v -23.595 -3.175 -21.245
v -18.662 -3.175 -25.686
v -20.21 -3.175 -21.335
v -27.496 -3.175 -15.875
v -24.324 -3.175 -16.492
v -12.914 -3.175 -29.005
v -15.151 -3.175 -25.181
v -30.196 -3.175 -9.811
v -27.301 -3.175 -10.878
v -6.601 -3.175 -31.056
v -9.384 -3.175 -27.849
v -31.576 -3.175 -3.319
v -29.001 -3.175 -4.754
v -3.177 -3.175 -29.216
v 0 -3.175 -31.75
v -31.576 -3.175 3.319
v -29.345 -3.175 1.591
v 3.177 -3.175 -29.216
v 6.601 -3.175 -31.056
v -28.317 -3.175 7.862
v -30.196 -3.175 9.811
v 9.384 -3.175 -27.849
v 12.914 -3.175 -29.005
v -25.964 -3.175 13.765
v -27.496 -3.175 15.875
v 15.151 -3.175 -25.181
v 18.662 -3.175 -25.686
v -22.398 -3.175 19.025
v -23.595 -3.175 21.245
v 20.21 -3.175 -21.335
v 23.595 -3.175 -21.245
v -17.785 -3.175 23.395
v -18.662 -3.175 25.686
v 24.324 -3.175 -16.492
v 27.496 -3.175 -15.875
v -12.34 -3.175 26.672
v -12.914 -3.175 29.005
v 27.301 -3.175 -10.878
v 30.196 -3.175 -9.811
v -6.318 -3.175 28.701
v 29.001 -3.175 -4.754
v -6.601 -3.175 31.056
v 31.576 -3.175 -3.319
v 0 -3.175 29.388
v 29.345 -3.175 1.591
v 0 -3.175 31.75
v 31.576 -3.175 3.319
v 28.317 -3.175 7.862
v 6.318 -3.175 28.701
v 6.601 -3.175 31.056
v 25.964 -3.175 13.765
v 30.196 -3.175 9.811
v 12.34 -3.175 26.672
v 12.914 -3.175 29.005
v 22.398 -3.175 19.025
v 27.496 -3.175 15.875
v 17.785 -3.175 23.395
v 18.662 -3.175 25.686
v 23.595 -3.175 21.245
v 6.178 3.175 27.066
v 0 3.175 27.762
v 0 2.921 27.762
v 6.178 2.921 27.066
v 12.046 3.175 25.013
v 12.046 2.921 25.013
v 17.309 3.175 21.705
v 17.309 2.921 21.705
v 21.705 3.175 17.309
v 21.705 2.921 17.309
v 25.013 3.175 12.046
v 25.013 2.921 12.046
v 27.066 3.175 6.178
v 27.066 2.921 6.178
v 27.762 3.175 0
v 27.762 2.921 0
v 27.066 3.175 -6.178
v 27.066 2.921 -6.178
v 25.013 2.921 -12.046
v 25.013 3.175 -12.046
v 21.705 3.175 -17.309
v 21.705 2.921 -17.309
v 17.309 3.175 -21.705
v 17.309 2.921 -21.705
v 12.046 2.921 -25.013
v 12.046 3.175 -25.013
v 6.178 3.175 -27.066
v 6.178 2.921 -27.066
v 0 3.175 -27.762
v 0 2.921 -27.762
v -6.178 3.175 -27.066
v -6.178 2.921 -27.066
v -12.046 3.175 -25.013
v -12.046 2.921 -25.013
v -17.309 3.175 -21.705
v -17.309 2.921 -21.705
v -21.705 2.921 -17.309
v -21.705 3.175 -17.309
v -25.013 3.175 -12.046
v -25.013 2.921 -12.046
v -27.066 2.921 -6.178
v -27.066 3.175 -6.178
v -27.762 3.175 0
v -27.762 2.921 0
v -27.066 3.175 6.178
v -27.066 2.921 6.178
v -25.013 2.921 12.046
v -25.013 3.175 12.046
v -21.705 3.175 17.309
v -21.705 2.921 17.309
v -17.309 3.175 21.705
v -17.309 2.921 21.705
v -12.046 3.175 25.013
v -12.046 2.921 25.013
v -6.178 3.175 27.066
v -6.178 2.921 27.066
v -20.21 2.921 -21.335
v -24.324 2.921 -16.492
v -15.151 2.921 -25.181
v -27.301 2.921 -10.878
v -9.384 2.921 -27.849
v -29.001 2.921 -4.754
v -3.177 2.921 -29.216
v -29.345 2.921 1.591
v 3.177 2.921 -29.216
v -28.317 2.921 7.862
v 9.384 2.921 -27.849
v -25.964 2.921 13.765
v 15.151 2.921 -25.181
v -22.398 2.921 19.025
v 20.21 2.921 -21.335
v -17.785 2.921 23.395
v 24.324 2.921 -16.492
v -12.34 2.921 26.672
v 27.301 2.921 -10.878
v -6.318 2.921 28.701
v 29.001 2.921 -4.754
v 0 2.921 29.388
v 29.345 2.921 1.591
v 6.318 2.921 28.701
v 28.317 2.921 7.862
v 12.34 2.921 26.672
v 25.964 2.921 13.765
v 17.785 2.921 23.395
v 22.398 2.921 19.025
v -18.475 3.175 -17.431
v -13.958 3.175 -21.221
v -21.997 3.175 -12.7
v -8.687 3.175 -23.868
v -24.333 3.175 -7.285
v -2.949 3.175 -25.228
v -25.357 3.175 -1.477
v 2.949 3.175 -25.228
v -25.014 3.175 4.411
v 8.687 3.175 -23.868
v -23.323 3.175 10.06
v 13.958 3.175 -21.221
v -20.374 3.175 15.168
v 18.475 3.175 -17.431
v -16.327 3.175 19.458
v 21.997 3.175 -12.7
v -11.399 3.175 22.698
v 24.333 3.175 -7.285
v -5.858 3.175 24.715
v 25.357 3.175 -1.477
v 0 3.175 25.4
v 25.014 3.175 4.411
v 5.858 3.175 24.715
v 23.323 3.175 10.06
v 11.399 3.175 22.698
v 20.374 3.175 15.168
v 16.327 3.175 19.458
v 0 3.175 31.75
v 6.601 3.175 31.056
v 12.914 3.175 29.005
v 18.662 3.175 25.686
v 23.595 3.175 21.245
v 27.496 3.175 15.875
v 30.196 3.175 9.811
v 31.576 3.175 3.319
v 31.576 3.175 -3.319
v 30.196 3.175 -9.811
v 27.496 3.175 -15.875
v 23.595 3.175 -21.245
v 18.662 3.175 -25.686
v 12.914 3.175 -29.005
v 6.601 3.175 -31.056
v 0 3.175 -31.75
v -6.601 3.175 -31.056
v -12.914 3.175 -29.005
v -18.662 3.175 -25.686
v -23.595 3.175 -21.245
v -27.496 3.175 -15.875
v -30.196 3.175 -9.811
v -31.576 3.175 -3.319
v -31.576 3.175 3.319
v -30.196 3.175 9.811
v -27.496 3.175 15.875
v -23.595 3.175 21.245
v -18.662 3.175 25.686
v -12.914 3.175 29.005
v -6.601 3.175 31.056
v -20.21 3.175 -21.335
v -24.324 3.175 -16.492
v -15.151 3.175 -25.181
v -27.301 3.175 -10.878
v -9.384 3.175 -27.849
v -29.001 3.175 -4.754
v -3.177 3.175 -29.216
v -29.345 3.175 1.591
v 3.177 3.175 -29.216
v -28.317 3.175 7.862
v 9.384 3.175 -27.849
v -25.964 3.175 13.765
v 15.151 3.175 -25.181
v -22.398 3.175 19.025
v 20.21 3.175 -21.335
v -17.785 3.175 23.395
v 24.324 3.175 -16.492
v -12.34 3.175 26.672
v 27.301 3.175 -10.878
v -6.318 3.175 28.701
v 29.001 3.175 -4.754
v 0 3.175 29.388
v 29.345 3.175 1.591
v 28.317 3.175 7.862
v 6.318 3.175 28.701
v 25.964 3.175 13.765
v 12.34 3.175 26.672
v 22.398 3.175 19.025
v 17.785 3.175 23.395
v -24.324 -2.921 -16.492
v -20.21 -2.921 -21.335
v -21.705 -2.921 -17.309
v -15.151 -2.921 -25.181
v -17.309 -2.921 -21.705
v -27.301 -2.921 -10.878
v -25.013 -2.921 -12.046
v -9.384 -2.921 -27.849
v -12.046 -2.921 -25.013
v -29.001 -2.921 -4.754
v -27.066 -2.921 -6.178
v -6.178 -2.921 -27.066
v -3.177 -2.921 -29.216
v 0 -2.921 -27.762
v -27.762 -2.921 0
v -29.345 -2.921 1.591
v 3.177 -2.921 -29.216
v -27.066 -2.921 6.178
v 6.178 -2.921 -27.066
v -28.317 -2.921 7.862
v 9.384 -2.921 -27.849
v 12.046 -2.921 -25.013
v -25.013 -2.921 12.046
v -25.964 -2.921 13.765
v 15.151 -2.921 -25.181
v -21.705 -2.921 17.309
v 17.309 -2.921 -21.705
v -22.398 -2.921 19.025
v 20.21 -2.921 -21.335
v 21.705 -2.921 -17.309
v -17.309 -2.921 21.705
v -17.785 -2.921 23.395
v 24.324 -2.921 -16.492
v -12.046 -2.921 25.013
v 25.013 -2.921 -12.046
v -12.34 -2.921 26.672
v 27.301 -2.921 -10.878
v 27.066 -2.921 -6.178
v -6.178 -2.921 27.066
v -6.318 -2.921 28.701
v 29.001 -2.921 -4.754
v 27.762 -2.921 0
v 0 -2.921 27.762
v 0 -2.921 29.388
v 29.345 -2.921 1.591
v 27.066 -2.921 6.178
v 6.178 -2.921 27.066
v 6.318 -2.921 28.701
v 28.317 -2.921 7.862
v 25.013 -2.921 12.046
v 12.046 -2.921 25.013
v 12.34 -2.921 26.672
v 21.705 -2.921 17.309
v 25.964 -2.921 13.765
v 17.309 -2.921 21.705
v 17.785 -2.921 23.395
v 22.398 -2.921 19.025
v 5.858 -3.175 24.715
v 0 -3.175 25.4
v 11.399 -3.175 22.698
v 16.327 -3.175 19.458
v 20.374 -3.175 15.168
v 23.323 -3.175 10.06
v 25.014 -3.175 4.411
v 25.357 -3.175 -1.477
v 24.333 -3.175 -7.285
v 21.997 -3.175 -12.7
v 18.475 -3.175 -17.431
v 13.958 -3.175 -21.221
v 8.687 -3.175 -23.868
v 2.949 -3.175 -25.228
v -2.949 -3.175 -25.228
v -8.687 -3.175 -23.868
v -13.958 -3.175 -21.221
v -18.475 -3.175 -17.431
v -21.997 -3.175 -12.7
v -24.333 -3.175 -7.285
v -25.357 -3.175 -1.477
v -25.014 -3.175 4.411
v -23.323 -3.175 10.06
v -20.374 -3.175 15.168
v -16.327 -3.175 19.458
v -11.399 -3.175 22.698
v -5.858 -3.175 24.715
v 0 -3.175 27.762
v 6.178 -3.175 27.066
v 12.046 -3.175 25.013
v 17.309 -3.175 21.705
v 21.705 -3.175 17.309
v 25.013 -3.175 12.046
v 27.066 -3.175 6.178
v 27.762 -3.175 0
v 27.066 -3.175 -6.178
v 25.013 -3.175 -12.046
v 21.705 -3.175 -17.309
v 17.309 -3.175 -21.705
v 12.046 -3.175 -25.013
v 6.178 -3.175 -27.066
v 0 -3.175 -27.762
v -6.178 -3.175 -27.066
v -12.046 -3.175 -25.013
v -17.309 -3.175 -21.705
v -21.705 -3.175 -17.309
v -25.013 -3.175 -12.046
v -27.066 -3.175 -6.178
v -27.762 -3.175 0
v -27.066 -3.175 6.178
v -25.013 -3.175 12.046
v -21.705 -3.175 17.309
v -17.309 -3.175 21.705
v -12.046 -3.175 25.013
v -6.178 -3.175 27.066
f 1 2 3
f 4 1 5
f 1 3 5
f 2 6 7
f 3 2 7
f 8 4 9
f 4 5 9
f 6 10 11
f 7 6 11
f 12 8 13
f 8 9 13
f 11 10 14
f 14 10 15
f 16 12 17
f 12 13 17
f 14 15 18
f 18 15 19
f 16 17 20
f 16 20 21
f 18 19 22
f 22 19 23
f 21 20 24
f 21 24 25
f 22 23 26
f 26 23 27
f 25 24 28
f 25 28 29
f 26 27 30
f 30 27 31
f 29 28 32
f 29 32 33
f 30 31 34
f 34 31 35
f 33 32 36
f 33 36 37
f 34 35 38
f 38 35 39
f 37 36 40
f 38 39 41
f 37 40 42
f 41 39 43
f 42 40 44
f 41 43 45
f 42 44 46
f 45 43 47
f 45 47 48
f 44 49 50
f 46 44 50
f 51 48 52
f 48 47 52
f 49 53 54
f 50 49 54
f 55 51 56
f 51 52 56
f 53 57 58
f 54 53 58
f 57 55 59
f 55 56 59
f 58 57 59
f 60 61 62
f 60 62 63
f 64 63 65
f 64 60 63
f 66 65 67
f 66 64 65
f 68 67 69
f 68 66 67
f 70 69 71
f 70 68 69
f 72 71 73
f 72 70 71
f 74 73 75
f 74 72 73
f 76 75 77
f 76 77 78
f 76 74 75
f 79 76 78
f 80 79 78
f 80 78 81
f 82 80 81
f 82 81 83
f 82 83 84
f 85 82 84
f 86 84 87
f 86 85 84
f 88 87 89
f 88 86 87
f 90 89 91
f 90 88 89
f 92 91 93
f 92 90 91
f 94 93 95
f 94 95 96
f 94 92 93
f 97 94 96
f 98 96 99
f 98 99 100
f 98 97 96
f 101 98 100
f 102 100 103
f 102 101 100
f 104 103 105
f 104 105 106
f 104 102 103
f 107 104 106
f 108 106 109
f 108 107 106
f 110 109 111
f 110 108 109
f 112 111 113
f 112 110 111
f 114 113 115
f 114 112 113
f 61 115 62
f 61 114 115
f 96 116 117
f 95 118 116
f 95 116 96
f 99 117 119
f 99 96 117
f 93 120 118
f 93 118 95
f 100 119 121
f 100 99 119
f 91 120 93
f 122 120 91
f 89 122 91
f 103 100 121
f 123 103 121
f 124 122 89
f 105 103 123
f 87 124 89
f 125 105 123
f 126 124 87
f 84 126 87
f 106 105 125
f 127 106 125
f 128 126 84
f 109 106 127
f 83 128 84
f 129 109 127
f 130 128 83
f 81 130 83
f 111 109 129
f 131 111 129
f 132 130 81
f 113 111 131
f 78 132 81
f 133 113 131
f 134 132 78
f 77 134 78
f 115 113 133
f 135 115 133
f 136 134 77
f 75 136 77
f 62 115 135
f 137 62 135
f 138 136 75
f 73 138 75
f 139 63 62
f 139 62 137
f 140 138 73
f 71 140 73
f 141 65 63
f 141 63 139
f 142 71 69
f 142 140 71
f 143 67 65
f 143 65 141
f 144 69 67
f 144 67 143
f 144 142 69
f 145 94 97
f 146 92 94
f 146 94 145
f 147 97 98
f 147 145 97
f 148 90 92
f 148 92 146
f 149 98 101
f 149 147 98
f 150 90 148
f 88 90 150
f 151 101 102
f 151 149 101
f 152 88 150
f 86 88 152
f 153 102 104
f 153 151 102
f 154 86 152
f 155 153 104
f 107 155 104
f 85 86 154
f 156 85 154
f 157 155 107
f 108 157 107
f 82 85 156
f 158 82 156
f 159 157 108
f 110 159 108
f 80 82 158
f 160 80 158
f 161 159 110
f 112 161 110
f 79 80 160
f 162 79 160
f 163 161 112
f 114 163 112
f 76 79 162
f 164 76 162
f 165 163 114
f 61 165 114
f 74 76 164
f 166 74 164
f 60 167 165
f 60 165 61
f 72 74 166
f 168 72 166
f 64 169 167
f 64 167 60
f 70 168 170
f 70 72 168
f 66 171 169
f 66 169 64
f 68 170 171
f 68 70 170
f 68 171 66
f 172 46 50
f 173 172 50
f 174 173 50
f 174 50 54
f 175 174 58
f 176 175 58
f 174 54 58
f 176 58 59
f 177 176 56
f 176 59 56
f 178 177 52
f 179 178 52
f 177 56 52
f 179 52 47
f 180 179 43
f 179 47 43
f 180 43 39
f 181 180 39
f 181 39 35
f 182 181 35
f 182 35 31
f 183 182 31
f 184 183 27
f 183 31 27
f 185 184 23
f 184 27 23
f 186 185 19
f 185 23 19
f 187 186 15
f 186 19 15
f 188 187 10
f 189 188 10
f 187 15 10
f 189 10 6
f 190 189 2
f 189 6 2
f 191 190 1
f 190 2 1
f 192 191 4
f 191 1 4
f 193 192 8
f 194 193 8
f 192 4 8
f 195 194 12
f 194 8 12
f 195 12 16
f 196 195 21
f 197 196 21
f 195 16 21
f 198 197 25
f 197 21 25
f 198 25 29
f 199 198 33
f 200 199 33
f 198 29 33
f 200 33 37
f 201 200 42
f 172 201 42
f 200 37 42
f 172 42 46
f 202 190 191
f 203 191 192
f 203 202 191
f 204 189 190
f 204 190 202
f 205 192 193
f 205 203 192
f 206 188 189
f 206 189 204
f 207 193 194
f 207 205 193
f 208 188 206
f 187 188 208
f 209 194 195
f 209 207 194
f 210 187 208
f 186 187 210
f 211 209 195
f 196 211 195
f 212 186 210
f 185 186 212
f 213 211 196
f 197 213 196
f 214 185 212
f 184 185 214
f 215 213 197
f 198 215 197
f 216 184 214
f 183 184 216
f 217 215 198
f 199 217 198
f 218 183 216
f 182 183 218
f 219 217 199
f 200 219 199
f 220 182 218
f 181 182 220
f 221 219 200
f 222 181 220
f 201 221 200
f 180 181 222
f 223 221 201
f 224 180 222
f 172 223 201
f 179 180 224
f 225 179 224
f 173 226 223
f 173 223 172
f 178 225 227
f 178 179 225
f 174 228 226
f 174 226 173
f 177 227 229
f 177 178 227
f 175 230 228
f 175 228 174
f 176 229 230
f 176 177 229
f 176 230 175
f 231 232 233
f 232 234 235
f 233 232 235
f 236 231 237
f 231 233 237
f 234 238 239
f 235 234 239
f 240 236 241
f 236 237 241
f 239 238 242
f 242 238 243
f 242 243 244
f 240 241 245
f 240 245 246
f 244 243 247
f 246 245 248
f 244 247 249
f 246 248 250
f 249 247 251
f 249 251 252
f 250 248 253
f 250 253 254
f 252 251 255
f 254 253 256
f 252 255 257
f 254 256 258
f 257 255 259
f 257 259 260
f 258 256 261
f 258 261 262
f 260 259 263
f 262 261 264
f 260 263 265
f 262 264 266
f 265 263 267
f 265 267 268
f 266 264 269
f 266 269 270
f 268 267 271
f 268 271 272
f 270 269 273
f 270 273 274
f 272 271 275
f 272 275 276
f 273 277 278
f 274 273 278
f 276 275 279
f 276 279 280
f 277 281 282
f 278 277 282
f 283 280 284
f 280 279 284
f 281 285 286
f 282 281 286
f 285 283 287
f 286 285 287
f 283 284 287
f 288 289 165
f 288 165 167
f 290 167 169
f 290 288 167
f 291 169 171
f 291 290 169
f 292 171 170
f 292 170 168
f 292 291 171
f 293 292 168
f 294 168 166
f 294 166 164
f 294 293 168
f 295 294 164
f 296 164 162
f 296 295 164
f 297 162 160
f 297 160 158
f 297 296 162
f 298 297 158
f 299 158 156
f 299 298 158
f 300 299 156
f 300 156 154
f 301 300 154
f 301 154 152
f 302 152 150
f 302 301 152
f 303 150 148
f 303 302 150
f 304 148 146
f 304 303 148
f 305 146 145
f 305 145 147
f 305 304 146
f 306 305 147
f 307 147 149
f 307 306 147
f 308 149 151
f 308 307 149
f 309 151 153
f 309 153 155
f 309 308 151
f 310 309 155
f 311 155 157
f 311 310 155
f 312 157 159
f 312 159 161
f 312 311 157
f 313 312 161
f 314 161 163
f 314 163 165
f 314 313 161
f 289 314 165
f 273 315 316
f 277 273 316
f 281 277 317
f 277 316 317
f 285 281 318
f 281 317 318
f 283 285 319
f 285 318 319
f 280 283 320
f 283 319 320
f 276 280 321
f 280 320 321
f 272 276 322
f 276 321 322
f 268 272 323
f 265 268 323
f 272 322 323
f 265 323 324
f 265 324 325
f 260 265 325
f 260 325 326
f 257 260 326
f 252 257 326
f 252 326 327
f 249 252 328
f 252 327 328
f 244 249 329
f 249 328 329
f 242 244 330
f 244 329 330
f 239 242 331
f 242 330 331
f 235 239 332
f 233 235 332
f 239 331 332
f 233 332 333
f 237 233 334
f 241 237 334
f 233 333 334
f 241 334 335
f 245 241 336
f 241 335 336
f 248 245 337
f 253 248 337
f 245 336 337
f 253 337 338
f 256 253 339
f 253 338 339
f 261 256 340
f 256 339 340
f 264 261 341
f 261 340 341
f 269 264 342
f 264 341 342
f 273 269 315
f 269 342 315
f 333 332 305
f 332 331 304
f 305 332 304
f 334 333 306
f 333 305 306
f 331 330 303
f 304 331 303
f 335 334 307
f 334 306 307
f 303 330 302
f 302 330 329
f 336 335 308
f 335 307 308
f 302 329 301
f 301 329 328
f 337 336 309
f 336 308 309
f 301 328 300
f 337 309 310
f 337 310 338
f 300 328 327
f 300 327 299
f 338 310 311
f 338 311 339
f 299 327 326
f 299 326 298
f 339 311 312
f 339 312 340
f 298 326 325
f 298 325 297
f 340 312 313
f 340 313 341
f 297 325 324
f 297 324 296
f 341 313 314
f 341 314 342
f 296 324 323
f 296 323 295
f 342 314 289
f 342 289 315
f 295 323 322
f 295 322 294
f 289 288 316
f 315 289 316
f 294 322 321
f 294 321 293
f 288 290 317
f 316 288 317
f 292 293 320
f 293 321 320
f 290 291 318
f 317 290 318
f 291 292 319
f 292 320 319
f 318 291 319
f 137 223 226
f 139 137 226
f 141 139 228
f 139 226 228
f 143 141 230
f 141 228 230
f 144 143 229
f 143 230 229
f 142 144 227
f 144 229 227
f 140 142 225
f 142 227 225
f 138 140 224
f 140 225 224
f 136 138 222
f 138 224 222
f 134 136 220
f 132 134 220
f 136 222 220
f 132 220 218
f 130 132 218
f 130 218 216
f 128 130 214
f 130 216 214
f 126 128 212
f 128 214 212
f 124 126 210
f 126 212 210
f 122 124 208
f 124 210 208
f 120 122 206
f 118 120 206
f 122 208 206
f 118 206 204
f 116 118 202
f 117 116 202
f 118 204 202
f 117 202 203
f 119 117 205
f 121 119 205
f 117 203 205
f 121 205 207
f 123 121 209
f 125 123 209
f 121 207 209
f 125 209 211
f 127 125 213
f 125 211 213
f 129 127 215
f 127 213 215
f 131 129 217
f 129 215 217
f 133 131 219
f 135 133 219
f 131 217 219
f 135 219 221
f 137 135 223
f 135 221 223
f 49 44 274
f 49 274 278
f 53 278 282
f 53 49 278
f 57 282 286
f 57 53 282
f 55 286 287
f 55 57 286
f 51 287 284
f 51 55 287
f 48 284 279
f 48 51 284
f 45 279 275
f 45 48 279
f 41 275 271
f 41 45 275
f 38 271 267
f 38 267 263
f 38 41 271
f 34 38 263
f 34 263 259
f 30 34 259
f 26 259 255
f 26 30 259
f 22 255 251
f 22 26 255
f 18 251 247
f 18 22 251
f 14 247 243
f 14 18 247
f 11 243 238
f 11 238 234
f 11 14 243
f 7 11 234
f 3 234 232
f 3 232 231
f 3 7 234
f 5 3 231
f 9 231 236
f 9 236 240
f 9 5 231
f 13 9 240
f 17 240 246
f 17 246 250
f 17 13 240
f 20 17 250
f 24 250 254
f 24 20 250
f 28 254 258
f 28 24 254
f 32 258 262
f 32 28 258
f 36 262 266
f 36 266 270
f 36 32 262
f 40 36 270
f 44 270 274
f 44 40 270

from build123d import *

# Parameters (mm, degrees)
EXTRUDE_1_DEPTH      = 3.175
EXTRUDE_1_DEPTH_BACK = 3.175
SKETCH_1_R           = 31.75
SKETCH_1_R_2         = 25.4
SKETCH_2_R           = 29.3878
SKETCH_2_R_2         = 27.7622
CUT_EXTRUDE_1_DEPTH  = 0.254


with BuildPart() as part:
    # ｽｹｯﾁ1 → ﾎﾞｽ - 押し出し1 (new, two sides: drawn at the far end of the back side and taken through both)
    with BuildSketch(Plane(origin=(0, 0, 0), x_dir=(1, 0, 0), z_dir=(0, 1, 0)).offset(-EXTRUDE_1_DEPTH_BACK)):
        Circle(SKETCH_1_R)
        Circle(SKETCH_1_R_2, mode=Mode.SUBTRACT)
    extrude(amount=EXTRUDE_1_DEPTH + EXTRUDE_1_DEPTH_BACK)

    # ｽｹｯﾁ2 → ｶｯﾄ - 押し出し1 (cut)
    with BuildSketch(Plane(origin=(0, 3.175, 0), x_dir=(1, 0, 0), z_dir=(0, 1, 0))):
        Circle(SKETCH_2_R)
        Circle(SKETCH_2_R_2, mode=Mode.SUBTRACT)
    cut_extrude_1 = extrude(amount=-CUT_EXTRUDE_1_DEPTH, mode=Mode.SUBTRACT)

    # ﾐﾗｰ1: ｶｯﾄ - 押し出し1 across plane
    add(cut_extrude_1.mirror(Plane.ZX), mode=Mode.SUBTRACT)


solid = part.part
